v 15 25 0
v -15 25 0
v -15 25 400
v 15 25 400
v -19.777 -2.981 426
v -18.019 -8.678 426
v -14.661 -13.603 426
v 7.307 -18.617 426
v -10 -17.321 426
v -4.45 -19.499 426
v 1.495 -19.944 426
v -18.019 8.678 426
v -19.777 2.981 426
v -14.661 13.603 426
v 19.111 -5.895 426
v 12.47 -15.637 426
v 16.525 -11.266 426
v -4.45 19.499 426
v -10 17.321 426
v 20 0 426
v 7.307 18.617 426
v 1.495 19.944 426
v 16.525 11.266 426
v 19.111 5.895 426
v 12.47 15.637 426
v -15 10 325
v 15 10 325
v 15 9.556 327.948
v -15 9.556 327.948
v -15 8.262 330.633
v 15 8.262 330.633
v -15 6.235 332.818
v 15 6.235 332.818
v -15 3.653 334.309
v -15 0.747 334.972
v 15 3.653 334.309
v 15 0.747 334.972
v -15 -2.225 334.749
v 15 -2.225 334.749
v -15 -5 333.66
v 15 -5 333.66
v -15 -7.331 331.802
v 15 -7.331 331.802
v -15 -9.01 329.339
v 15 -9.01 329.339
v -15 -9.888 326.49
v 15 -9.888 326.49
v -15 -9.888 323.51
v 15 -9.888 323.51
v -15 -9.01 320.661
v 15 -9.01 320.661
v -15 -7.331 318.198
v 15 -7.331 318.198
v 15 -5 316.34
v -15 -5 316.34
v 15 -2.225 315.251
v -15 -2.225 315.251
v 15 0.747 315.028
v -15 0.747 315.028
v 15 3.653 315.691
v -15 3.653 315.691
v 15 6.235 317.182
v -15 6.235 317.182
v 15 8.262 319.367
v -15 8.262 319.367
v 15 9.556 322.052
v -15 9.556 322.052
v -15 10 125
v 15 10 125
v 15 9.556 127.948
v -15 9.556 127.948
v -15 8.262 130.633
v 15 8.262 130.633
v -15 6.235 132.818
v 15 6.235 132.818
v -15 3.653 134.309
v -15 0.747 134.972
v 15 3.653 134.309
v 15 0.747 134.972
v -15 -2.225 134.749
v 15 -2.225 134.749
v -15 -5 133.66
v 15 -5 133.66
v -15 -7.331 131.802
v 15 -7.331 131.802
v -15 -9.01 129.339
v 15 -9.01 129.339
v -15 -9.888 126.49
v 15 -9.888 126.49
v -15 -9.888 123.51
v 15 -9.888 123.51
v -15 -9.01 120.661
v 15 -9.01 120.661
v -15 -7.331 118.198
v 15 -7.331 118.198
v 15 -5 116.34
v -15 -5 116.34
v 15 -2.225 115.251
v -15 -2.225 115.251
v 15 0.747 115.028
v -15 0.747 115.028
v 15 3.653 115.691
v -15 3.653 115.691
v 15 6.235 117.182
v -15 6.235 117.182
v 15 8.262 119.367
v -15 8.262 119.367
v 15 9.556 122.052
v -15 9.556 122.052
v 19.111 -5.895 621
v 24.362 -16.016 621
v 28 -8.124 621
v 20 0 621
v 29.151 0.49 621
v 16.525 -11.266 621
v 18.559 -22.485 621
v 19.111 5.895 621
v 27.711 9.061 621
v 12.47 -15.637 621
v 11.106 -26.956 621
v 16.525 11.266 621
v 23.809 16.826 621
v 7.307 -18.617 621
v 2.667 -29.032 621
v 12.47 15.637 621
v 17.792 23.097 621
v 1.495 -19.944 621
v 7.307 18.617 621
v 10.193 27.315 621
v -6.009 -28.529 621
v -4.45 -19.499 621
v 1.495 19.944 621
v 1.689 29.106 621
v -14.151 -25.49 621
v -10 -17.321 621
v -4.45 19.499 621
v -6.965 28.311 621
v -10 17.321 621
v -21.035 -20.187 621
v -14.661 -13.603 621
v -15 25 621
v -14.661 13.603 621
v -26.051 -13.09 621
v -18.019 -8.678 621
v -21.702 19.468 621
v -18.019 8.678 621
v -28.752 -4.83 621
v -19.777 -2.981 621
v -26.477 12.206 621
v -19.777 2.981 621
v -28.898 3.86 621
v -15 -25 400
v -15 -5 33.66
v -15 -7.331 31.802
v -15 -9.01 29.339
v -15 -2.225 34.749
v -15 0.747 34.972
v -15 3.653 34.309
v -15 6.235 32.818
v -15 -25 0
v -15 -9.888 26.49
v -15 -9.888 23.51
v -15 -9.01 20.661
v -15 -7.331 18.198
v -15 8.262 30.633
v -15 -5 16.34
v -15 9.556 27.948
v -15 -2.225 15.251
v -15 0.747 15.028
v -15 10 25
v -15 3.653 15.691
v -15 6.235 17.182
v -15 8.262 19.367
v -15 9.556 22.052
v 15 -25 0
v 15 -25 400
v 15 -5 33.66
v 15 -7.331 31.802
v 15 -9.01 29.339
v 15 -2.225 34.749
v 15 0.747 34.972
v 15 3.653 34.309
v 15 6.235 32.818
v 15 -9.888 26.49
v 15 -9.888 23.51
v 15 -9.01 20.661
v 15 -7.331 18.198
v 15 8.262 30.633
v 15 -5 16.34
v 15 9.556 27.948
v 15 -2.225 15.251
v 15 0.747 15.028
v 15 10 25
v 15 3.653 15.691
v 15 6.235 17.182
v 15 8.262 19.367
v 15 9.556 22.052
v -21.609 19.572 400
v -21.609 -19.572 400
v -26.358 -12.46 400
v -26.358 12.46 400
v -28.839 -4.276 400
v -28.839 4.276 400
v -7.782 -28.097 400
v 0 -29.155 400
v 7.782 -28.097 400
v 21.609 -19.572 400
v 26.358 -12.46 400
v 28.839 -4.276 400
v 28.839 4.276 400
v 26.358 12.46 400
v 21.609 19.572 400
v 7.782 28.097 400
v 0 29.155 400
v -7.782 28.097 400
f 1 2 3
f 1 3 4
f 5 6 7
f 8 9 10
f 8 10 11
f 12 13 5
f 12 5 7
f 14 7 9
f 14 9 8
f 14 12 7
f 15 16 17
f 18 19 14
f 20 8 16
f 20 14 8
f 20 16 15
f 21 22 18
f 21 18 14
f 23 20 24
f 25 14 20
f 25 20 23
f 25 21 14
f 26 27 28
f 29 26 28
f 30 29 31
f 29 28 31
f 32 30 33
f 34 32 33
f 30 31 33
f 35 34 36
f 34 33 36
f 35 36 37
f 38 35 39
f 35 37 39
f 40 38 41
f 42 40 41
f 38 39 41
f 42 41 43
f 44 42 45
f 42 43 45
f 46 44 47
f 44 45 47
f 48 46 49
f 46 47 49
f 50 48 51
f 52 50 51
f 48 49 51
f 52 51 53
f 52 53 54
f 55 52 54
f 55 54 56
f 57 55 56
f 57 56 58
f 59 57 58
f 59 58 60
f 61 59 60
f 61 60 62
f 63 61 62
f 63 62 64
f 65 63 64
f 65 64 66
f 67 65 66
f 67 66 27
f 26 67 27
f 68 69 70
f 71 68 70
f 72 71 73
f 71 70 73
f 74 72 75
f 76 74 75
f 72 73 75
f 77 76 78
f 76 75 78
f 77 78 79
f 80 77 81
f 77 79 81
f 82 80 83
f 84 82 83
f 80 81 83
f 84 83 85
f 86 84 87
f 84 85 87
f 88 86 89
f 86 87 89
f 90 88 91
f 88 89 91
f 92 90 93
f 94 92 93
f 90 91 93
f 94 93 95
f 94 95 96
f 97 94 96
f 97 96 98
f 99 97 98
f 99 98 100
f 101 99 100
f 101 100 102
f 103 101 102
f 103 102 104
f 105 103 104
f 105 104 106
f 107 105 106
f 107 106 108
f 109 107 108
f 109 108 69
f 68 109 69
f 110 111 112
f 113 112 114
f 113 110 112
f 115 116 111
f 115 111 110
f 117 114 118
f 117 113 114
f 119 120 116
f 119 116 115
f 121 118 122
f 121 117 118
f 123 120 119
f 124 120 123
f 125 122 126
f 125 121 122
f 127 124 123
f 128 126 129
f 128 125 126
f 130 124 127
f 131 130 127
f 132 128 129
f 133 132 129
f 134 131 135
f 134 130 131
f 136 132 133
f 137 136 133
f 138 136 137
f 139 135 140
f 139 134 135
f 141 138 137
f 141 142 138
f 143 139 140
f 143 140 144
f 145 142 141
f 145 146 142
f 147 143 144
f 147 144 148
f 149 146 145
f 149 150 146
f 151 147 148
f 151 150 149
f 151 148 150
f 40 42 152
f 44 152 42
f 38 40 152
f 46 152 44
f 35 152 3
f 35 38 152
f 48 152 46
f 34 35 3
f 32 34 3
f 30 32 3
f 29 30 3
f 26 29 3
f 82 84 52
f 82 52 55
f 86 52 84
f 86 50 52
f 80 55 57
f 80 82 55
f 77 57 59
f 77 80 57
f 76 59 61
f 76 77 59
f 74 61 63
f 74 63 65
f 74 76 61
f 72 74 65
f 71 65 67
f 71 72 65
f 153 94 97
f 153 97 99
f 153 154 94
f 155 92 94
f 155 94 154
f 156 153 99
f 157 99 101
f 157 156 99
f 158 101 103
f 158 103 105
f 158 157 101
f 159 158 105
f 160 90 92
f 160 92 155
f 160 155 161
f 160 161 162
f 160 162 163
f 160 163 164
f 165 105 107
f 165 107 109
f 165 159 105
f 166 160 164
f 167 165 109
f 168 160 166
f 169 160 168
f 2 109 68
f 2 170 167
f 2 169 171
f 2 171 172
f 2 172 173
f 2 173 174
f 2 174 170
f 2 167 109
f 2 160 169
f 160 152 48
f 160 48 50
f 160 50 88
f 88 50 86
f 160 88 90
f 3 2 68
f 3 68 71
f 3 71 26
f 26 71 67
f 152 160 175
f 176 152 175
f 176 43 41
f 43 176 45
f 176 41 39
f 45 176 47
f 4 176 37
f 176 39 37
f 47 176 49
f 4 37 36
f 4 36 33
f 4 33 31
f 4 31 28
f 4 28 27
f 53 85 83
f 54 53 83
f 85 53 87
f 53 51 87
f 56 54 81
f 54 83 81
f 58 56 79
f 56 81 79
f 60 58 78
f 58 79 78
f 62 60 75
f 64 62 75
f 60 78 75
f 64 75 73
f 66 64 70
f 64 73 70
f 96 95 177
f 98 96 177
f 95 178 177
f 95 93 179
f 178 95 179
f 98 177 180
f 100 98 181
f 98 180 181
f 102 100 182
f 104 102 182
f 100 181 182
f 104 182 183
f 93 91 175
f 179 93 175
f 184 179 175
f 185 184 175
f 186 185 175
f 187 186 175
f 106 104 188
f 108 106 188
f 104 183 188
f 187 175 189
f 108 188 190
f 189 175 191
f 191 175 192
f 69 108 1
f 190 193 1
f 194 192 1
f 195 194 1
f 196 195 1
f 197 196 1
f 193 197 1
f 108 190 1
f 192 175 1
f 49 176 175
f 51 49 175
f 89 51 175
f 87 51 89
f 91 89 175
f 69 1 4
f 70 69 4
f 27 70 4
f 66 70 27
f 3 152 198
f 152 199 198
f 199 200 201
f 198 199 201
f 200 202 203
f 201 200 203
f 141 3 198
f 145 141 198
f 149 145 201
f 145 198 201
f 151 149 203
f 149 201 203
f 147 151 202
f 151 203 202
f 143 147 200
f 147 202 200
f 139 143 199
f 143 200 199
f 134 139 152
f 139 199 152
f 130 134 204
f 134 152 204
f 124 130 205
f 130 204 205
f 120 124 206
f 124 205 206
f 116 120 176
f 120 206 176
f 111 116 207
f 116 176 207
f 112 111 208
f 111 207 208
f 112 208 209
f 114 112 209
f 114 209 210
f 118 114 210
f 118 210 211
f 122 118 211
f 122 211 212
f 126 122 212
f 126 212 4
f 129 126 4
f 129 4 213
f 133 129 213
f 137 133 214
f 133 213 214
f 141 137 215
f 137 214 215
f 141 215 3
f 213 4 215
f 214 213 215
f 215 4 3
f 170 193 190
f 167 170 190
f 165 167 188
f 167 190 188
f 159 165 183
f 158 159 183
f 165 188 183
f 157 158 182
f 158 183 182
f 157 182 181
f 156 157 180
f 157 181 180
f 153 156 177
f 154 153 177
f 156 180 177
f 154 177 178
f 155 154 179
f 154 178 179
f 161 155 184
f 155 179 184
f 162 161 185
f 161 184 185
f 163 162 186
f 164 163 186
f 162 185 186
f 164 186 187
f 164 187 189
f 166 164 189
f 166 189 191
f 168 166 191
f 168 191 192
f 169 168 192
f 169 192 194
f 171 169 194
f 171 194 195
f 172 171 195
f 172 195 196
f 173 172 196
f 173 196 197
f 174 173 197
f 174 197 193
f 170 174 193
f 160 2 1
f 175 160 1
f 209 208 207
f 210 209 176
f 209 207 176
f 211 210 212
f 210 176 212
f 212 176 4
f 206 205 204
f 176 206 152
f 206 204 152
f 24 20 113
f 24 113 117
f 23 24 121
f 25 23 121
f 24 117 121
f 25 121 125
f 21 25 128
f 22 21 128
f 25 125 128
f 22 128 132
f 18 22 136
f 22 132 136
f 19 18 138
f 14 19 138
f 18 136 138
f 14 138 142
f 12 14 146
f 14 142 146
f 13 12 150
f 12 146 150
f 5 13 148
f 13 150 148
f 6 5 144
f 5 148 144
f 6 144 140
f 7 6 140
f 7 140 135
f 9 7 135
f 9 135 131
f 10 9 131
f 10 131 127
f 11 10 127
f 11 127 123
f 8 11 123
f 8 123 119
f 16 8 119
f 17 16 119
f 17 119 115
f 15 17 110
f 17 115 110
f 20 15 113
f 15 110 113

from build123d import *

# Parameters (mm, degrees)
ESQUISSE1_W             = 30
ESQUISSE1_H             = 50
BOSS_EXTRU_1_DEPTH      = 400
ESQUISSE2_R             = 29.154759474
BOSS_EXTRU_2_DEPTH      = 221
ESQUISSE3_R             = 20
ENL_V_MAT_EXTRU_1_DEPTH = 195
ENL_V_MAT_EXTRU_2_REACH = 625.25
ESQUISSE4_R             = 10


with BuildPart() as part:
    # Esquisse1 → Boss.-Extru.1 (new body)
    with BuildSketch(Plane.XY):
        Rectangle(ESQUISSE1_W, ESQUISSE1_H)
    extrude(amount=BOSS_EXTRU_1_DEPTH)

    # Esquisse2 → Boss.-Extru.2 (add)
    with BuildSketch(Plane.XY.offset(400)):
        with Locations(Location((0, 0, 0), (0, 0, 120.963756532))):
            Circle(ESQUISSE2_R)
    extrude(amount=BOSS_EXTRU_2_DEPTH)

    # Esquisse3 → Enlèv. mat.-Extru.1 (cut)
    with BuildSketch(Plane.XY.offset(621)):
        Circle(ESQUISSE3_R)
    extrude(amount=-ENL_V_MAT_EXTRU_1_DEPTH, mode=Mode.SUBTRACT)

    # Esquisse4 → Enlèv. mat.-Extru.2 (cut, up to next)
    with BuildSketch(Plane(origin=(15, 0, 0), x_dir=(0, 0, -1), z_dir=(1, 0, 0)), mode=Mode.PRIVATE) as enl_v_mat_extru_2_sk1:
        with Locations(Location((-25, 0, 0), (0, 0, 90))):
            Circle(ESQUISSE4_R)
    enl_v_mat_extru_2_tool1 = extrude(enl_v_mat_extru_2_sk1.sketch, amount=-ENL_V_MAT_EXTRU_2_REACH, mode=Mode.PRIVATE) & part.part
    # Esquisse4 → Enlèv. mat.-Extru.2 (cut, up to next)
    with BuildSketch(Plane(origin=(15, 0, 0), x_dir=(0, 0, -1), z_dir=(1, 0, 0)), mode=Mode.PRIVATE) as enl_v_mat_extru_2_sk2:
        with Locations(Location((-125, 0, 0), (0, 0, 90))):
            Circle(ESQUISSE4_R)
    enl_v_mat_extru_2_tool2 = extrude(enl_v_mat_extru_2_sk2.sketch, amount=-ENL_V_MAT_EXTRU_2_REACH, mode=Mode.PRIVATE) & part.part
    # Esquisse4 → Enlèv. mat.-Extru.2 (cut, up to next)
    with BuildSketch(Plane(origin=(15, 0, 0), x_dir=(0, 0, -1), z_dir=(1, 0, 0)), mode=Mode.PRIVATE) as enl_v_mat_extru_2_sk3:
        with Locations(Location((-325, 0, 0), (0, 0, 90))):
            Circle(ESQUISSE4_R)
    enl_v_mat_extru_2_tool3 = extrude(enl_v_mat_extru_2_sk3.sketch, amount=-ENL_V_MAT_EXTRU_2_REACH, mode=Mode.PRIVATE) & part.part
    add(enl_v_mat_extru_2_tool1.solids().sort_by_distance((15, 0, 25))[0], mode=Mode.SUBTRACT)
    add(enl_v_mat_extru_2_tool2.solids().sort_by_distance((15, 0, 125))[0], mode=Mode.SUBTRACT)
    add(enl_v_mat_extru_2_tool3.solids().sort_by_distance((15, 0, 325))[0], mode=Mode.SUBTRACT)


solid = part.part
